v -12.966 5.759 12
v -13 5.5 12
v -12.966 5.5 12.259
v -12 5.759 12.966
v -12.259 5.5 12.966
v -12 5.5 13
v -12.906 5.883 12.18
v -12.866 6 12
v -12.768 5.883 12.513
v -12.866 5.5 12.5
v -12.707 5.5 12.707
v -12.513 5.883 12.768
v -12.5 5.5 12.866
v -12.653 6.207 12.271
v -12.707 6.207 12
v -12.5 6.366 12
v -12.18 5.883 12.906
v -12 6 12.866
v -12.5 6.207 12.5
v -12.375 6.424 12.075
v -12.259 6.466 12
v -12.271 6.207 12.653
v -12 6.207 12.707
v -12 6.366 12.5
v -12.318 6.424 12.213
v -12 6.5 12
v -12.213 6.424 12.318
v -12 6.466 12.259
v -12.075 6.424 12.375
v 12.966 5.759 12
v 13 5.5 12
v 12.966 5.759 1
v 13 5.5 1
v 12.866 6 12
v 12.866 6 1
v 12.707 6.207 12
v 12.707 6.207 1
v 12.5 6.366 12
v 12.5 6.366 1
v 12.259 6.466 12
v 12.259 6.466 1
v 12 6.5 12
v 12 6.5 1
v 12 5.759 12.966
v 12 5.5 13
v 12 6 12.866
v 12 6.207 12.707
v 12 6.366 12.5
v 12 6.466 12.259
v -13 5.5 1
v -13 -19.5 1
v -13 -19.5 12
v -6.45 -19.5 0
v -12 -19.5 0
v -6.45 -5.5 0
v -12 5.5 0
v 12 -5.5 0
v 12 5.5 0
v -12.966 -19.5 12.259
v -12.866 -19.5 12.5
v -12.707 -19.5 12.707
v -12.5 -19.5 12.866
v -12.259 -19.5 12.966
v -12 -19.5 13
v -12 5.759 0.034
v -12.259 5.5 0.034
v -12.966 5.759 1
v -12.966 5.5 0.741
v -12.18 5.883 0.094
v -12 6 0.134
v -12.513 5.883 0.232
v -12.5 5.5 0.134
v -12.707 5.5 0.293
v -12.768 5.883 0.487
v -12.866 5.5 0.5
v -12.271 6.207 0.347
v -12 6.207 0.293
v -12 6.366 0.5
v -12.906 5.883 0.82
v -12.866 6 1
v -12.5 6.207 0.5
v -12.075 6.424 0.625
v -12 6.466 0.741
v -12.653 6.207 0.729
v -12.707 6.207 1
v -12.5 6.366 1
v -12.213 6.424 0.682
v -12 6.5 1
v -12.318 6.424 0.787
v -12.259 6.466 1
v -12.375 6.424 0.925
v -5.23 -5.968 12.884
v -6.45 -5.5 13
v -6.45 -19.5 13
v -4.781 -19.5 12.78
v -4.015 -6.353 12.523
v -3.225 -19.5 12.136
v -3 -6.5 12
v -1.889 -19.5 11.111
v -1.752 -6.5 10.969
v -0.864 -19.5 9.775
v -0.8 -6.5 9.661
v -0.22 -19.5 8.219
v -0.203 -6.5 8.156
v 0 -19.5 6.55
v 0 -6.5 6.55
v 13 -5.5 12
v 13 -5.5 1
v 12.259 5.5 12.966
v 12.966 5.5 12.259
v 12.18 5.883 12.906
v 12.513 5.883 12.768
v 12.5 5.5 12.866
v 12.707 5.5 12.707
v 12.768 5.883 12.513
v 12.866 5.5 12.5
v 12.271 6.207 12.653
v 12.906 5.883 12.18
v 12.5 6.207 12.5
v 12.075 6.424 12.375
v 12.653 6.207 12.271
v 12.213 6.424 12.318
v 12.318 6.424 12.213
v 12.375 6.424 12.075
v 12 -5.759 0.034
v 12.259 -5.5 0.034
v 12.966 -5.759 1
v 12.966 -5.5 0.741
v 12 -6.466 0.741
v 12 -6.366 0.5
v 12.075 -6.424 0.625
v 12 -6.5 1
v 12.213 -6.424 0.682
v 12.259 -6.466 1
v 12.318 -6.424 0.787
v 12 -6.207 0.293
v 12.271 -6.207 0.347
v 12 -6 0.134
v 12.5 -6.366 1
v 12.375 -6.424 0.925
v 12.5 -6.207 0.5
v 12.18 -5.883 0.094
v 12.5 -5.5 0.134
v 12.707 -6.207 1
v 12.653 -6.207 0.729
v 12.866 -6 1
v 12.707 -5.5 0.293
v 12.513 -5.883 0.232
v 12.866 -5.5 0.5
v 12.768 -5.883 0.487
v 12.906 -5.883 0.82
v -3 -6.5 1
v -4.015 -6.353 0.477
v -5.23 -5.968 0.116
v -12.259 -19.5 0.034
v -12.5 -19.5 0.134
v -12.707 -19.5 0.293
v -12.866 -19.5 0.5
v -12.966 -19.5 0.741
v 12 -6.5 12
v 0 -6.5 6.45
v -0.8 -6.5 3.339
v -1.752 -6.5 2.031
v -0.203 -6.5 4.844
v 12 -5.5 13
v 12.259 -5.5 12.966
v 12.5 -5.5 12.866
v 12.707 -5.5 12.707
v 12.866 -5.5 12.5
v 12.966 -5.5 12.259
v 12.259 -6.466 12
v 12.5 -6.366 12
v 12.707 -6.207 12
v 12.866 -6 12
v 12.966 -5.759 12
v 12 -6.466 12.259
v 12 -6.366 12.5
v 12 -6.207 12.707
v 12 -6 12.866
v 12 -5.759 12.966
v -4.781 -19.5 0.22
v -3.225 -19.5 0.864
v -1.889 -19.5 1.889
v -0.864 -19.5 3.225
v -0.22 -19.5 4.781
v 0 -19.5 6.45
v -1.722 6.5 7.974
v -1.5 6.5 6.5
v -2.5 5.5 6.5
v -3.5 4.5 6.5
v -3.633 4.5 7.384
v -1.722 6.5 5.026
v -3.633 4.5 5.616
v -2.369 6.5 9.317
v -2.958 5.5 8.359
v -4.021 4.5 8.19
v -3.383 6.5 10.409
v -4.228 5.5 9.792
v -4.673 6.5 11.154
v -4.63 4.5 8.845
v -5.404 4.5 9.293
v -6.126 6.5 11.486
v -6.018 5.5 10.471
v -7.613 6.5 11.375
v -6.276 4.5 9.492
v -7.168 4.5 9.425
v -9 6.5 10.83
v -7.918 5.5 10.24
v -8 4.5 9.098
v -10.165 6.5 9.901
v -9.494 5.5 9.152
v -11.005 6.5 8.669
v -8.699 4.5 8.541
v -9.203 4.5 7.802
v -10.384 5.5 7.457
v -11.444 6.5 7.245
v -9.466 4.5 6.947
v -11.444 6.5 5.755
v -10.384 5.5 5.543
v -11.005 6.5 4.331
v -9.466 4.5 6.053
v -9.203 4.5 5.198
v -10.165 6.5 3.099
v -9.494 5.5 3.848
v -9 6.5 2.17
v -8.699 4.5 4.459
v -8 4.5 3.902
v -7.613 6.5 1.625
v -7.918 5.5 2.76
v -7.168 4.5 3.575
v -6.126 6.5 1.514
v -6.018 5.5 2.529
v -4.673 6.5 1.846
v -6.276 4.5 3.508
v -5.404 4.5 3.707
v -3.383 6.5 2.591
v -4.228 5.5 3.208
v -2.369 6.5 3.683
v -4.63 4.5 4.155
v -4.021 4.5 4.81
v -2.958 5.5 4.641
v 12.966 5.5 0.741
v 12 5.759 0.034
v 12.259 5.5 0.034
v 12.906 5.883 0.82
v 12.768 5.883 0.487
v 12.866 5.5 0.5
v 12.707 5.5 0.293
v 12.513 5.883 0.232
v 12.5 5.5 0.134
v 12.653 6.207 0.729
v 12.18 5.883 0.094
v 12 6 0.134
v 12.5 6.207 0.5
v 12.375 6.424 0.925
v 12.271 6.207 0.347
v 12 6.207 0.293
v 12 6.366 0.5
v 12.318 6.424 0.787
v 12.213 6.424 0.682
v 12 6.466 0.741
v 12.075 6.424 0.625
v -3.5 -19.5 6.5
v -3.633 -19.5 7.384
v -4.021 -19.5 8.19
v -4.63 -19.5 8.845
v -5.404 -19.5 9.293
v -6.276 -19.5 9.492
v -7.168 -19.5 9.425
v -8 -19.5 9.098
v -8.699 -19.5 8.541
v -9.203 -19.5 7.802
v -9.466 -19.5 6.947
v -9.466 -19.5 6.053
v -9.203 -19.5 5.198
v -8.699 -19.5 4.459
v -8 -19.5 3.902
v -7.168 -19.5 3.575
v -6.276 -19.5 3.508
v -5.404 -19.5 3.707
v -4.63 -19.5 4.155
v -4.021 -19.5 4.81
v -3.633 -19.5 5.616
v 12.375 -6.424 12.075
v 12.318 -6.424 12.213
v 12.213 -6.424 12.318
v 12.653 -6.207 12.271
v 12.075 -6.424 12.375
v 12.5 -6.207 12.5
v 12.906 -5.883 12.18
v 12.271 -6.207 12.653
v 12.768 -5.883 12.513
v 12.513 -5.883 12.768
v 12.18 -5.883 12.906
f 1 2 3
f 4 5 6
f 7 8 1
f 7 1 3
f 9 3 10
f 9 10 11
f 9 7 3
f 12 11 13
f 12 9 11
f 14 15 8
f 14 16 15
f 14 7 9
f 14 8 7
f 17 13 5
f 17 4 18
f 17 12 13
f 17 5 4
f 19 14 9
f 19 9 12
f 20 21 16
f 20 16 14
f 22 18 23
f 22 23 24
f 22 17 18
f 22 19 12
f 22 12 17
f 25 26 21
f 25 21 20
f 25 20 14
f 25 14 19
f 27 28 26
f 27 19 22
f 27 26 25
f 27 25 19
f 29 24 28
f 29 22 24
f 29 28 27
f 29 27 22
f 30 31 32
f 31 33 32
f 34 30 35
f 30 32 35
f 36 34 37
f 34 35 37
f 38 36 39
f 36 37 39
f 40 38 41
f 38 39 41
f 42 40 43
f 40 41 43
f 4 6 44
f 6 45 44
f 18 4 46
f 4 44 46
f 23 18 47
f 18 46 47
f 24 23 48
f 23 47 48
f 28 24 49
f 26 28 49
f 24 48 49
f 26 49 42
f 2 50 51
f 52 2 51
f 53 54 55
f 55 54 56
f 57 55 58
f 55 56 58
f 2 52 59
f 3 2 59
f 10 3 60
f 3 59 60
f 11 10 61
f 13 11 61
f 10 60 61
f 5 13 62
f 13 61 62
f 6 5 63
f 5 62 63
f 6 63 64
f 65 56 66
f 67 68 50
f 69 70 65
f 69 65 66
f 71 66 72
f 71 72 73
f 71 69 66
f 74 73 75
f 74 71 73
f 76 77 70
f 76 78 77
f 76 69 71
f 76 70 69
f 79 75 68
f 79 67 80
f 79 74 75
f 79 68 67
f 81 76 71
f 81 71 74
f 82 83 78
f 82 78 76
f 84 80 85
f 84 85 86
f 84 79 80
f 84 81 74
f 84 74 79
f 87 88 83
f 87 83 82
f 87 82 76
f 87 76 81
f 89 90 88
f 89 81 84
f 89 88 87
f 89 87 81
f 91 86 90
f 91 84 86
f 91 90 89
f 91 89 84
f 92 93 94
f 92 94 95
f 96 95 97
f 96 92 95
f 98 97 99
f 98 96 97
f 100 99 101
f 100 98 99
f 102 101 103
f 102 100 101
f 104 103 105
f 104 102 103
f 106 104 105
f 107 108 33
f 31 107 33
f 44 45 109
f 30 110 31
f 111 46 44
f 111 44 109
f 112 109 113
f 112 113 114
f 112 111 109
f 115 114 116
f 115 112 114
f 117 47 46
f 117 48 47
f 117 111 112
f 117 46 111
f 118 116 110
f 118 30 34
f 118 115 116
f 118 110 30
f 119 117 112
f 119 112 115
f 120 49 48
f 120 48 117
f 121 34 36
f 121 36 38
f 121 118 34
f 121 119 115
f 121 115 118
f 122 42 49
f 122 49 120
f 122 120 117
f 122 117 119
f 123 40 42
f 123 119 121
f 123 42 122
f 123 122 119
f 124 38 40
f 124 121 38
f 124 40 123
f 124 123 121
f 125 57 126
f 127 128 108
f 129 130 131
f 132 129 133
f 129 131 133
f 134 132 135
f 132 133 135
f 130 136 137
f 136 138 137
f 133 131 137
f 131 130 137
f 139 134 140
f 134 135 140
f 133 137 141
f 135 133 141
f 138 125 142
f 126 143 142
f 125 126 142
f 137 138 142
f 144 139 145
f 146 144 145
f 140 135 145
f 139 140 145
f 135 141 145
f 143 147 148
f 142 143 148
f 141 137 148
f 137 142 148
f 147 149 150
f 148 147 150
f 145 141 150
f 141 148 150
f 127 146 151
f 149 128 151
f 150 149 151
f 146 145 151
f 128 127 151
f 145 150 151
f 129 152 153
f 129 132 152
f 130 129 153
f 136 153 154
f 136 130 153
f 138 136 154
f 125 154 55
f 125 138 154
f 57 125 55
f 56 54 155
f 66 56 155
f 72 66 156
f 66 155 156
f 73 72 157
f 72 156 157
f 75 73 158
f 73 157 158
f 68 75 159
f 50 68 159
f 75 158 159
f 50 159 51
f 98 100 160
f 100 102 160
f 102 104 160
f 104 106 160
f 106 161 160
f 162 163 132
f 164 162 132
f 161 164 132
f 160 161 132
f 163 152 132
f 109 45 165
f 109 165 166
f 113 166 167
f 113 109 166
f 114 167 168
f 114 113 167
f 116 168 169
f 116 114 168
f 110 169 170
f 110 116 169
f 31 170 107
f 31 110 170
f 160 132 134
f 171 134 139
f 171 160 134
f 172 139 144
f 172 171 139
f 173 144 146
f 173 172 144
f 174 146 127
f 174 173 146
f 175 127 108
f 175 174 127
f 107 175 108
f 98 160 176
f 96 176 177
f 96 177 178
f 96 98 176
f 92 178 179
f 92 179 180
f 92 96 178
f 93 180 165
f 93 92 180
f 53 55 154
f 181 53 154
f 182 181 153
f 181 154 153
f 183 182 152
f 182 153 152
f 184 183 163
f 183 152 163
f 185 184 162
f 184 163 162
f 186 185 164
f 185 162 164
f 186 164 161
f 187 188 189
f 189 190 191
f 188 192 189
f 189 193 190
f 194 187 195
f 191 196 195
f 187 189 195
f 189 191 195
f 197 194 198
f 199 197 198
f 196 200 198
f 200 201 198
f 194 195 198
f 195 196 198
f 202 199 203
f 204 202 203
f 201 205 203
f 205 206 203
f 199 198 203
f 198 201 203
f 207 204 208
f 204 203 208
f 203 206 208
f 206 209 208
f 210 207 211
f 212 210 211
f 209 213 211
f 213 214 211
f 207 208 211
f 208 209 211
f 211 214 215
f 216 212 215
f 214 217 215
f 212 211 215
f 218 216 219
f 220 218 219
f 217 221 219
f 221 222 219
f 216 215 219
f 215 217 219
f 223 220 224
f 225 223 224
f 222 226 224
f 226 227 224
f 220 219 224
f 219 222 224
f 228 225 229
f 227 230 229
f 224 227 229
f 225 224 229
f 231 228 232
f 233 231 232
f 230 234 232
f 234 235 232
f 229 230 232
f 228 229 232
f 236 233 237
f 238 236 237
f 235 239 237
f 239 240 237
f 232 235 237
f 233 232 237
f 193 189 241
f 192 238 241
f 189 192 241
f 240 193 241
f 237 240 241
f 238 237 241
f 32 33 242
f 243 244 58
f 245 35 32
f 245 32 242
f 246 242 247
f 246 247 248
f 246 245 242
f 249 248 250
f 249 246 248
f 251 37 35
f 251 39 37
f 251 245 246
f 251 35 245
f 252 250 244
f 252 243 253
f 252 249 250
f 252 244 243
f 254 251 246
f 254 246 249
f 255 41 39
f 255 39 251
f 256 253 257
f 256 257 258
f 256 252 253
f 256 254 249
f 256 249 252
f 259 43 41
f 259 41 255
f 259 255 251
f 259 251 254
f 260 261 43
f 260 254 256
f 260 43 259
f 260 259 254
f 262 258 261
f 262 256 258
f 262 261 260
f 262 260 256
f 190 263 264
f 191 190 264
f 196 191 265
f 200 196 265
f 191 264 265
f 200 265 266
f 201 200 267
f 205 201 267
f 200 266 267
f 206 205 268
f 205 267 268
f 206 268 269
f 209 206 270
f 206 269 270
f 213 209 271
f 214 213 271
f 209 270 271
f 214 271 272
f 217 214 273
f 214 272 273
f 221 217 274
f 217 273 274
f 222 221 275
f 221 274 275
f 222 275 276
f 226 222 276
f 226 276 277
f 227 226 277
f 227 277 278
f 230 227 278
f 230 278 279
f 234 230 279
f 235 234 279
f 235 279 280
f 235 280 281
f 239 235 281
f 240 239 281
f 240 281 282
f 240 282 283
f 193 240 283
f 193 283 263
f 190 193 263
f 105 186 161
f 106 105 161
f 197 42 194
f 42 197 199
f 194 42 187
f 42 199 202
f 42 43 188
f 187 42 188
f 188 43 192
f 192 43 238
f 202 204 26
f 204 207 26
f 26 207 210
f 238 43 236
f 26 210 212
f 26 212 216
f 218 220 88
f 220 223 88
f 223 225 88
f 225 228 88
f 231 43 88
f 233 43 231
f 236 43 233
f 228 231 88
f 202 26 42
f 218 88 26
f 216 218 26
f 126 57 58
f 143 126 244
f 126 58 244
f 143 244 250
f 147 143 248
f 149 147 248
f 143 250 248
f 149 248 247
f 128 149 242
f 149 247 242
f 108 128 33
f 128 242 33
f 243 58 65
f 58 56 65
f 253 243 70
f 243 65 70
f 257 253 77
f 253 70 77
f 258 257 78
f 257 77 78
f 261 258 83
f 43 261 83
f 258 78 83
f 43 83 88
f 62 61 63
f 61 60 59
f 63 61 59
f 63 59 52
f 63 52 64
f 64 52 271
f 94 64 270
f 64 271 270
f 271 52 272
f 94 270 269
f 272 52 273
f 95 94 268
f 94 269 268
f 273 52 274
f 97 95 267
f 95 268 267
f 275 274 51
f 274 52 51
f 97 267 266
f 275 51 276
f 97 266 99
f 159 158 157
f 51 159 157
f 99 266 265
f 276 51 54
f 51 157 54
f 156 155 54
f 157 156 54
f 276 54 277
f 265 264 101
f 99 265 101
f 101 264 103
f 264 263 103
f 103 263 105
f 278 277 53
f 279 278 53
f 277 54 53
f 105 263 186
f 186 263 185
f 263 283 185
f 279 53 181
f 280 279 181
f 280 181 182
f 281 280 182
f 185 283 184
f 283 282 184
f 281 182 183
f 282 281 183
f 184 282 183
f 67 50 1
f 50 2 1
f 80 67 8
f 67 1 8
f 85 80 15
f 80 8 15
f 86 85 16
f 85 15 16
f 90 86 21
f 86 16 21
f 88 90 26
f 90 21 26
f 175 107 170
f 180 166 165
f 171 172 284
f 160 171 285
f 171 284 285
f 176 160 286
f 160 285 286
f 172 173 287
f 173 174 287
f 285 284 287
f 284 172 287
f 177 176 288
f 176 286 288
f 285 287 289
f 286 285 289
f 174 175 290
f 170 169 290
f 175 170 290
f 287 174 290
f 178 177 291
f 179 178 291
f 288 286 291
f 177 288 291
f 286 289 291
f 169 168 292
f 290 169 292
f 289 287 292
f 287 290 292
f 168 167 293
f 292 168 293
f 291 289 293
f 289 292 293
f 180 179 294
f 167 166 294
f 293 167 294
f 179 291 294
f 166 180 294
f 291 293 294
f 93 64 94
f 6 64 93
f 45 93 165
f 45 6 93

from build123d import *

# Parameters (mm, degrees)
PAD_DEPTH    = 13
SKETCH001_R  = 3
POCKET_DEPTH = 26.001
CHAMFER_SIZE = 2
FILLET_R     = 6.45
FILLET001_R  = 1
FILLET002_R  = 1
FILLET003_R  = 1


with BuildPart() as part:
    # Sketch → Pad (new body)
    with BuildSketch(Plane.XY):
        Polygon((-13, 6.5), (-13, -19.5), (0, -19.5), (0, -6.5), (13, -6.5), (13, 6.5), align=None)
    extrude(amount=PAD_DEPTH)

    # Sketch001 (on Face2 of Pad) → Pocket (cut, through all)
    with BuildSketch(Plane.XZ.offset(19.5)):
        with Locations((-6.5, 6.5)):
            Circle(SKETCH001_R)
    extrude(amount=-POCKET_DEPTH, mode=Mode.SUBTRACT)

    # Chamfer
    chamfer_edges = [part.edges().sort_by_distance(p)[0] for p in [
        (-9.5, 6.5, 6.5),
    ]]
    chamfer(chamfer_edges, length=CHAMFER_SIZE)

    # Fillet
    fillet_edges = [part.edges().sort_by_distance(p)[0] for p in [
        (0, -13, 13),
        (0, -13, 0),
    ]]
    fillet(fillet_edges, radius=FILLET_R)

    # Fillet001
    fillet001_edges = [part.edges().sort_by_distance(p)[0] for p in [
        (-13, -6.5, 13),
        (-13, -6.5, 0),
        (13, 0, 13),
        (13, 0, 0),
    ]]
    fillet(fillet001_edges, radius=FILLET001_R)

    # Fillet002
    fillet002_edges = [part.edges().sort_by_distance(p)[0] for p in [
        (0, 6.5, 0),
        (0, 6.5, 13),
        (13, 6.5, 6.5),
        (12.707107, 6.5, 0.292893),
        (12.707107, 6.5, 12.707107),
    ]]
    fillet(fillet002_edges, radius=FILLET002_R)

    # Fillet003
    fillet003_edges = [part.edges().sort_by_distance(p)[0] for p in [
        (6, -6.5, 13),
        (13, -6.5, 6.5),
        (6, -6.5, 0),
    ]]
    fillet(fillet003_edges, radius=FILLET003_R)


solid = part.part
